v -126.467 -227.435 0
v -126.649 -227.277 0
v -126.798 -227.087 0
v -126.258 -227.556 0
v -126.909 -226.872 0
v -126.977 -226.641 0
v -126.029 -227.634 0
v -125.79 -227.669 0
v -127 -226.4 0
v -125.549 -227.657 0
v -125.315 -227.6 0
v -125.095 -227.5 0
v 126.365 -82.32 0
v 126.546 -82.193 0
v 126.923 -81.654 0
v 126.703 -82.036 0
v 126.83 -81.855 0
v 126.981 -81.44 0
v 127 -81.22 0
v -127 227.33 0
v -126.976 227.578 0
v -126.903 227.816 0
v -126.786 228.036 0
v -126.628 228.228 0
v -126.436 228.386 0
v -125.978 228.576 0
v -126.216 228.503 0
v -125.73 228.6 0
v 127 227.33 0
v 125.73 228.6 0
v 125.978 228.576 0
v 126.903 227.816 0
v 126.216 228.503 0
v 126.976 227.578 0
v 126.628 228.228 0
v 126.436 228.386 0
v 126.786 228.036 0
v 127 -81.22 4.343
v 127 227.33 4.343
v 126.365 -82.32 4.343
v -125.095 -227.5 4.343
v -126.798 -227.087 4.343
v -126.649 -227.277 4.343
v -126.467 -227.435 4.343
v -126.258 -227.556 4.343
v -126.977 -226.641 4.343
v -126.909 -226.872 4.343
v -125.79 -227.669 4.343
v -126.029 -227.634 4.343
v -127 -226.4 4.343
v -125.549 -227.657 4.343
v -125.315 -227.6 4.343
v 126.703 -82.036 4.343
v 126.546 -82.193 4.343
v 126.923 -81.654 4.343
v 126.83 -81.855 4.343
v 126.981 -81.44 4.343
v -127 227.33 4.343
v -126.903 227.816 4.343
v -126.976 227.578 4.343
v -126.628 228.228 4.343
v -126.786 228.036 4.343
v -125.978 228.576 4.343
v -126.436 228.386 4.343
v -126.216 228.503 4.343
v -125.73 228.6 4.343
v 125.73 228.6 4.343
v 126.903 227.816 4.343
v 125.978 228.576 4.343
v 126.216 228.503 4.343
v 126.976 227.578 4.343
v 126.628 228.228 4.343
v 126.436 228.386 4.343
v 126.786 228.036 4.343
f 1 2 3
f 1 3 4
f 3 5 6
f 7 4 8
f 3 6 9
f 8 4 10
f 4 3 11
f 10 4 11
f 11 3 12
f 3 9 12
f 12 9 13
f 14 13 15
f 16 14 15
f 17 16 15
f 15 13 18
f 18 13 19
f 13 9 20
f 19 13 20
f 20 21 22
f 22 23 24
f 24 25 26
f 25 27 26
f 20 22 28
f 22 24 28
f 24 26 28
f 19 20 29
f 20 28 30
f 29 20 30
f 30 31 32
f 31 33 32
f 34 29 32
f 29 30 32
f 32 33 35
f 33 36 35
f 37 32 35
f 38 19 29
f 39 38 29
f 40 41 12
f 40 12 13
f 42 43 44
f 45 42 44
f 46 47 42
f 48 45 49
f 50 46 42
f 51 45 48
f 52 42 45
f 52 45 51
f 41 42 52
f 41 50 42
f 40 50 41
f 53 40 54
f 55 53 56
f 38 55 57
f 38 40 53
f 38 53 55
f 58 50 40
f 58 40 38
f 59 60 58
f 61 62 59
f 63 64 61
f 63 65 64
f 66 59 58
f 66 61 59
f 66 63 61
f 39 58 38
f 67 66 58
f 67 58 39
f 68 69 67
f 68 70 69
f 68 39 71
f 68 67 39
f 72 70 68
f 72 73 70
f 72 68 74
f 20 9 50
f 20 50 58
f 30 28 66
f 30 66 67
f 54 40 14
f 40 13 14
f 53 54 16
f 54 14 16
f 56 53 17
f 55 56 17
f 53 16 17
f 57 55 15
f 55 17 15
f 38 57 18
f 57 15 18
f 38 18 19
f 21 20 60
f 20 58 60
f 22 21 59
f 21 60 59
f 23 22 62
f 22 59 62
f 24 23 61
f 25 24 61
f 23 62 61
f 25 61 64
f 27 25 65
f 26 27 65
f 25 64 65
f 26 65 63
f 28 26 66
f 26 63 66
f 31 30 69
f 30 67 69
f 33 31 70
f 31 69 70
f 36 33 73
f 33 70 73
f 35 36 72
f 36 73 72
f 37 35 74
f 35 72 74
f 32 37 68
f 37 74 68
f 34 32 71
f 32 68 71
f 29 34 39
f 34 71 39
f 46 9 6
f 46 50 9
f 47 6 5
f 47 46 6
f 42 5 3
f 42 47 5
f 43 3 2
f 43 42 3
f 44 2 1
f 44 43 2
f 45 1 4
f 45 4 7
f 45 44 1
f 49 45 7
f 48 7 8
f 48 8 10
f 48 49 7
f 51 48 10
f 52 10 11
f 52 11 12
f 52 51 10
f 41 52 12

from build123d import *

# Parameters (mm, degrees)
SKETCH1_W           = 254
SKETCH1_H           = 457.2
BOSS_EXTRUDE1_DEPTH = 4.3434
CUT_EXTRUDE3_DEPTH  = 5.3434
FILLET2_R           = 1.27


with BuildPart() as part:
    # Sketch1 → Boss-Extrude1 (new body)
    with BuildSketch(Plane.XY):
        Rectangle(SKETCH1_W, SKETCH1_H)
    extrude(amount=BOSS_EXTRUDE1_DEPTH)

    # Sketch4 → Cut-Extrude3 (cut, through all)
    with BuildSketch(Plane.XY.offset(4.3434)):
        Polygon((-127, -228.6), (127, -81.953031626), (127, -228.6), align=None)
    extrude(amount=-CUT_EXTRUDE3_DEPTH, mode=Mode.SUBTRACT)

    # Fillet2
    fillet2_edges = [part.edges().sort_by_distance(p)[0] for p in [
        (127, -81.953031626, 2.1717),
        (-127, -228.6, 2.1717),
        (-127, 228.6, 2.1717),
        (127, 228.6, 2.1717),
    ]]
    fillet(fillet2_edges, radius=FILLET2_R)


solid = part.part
